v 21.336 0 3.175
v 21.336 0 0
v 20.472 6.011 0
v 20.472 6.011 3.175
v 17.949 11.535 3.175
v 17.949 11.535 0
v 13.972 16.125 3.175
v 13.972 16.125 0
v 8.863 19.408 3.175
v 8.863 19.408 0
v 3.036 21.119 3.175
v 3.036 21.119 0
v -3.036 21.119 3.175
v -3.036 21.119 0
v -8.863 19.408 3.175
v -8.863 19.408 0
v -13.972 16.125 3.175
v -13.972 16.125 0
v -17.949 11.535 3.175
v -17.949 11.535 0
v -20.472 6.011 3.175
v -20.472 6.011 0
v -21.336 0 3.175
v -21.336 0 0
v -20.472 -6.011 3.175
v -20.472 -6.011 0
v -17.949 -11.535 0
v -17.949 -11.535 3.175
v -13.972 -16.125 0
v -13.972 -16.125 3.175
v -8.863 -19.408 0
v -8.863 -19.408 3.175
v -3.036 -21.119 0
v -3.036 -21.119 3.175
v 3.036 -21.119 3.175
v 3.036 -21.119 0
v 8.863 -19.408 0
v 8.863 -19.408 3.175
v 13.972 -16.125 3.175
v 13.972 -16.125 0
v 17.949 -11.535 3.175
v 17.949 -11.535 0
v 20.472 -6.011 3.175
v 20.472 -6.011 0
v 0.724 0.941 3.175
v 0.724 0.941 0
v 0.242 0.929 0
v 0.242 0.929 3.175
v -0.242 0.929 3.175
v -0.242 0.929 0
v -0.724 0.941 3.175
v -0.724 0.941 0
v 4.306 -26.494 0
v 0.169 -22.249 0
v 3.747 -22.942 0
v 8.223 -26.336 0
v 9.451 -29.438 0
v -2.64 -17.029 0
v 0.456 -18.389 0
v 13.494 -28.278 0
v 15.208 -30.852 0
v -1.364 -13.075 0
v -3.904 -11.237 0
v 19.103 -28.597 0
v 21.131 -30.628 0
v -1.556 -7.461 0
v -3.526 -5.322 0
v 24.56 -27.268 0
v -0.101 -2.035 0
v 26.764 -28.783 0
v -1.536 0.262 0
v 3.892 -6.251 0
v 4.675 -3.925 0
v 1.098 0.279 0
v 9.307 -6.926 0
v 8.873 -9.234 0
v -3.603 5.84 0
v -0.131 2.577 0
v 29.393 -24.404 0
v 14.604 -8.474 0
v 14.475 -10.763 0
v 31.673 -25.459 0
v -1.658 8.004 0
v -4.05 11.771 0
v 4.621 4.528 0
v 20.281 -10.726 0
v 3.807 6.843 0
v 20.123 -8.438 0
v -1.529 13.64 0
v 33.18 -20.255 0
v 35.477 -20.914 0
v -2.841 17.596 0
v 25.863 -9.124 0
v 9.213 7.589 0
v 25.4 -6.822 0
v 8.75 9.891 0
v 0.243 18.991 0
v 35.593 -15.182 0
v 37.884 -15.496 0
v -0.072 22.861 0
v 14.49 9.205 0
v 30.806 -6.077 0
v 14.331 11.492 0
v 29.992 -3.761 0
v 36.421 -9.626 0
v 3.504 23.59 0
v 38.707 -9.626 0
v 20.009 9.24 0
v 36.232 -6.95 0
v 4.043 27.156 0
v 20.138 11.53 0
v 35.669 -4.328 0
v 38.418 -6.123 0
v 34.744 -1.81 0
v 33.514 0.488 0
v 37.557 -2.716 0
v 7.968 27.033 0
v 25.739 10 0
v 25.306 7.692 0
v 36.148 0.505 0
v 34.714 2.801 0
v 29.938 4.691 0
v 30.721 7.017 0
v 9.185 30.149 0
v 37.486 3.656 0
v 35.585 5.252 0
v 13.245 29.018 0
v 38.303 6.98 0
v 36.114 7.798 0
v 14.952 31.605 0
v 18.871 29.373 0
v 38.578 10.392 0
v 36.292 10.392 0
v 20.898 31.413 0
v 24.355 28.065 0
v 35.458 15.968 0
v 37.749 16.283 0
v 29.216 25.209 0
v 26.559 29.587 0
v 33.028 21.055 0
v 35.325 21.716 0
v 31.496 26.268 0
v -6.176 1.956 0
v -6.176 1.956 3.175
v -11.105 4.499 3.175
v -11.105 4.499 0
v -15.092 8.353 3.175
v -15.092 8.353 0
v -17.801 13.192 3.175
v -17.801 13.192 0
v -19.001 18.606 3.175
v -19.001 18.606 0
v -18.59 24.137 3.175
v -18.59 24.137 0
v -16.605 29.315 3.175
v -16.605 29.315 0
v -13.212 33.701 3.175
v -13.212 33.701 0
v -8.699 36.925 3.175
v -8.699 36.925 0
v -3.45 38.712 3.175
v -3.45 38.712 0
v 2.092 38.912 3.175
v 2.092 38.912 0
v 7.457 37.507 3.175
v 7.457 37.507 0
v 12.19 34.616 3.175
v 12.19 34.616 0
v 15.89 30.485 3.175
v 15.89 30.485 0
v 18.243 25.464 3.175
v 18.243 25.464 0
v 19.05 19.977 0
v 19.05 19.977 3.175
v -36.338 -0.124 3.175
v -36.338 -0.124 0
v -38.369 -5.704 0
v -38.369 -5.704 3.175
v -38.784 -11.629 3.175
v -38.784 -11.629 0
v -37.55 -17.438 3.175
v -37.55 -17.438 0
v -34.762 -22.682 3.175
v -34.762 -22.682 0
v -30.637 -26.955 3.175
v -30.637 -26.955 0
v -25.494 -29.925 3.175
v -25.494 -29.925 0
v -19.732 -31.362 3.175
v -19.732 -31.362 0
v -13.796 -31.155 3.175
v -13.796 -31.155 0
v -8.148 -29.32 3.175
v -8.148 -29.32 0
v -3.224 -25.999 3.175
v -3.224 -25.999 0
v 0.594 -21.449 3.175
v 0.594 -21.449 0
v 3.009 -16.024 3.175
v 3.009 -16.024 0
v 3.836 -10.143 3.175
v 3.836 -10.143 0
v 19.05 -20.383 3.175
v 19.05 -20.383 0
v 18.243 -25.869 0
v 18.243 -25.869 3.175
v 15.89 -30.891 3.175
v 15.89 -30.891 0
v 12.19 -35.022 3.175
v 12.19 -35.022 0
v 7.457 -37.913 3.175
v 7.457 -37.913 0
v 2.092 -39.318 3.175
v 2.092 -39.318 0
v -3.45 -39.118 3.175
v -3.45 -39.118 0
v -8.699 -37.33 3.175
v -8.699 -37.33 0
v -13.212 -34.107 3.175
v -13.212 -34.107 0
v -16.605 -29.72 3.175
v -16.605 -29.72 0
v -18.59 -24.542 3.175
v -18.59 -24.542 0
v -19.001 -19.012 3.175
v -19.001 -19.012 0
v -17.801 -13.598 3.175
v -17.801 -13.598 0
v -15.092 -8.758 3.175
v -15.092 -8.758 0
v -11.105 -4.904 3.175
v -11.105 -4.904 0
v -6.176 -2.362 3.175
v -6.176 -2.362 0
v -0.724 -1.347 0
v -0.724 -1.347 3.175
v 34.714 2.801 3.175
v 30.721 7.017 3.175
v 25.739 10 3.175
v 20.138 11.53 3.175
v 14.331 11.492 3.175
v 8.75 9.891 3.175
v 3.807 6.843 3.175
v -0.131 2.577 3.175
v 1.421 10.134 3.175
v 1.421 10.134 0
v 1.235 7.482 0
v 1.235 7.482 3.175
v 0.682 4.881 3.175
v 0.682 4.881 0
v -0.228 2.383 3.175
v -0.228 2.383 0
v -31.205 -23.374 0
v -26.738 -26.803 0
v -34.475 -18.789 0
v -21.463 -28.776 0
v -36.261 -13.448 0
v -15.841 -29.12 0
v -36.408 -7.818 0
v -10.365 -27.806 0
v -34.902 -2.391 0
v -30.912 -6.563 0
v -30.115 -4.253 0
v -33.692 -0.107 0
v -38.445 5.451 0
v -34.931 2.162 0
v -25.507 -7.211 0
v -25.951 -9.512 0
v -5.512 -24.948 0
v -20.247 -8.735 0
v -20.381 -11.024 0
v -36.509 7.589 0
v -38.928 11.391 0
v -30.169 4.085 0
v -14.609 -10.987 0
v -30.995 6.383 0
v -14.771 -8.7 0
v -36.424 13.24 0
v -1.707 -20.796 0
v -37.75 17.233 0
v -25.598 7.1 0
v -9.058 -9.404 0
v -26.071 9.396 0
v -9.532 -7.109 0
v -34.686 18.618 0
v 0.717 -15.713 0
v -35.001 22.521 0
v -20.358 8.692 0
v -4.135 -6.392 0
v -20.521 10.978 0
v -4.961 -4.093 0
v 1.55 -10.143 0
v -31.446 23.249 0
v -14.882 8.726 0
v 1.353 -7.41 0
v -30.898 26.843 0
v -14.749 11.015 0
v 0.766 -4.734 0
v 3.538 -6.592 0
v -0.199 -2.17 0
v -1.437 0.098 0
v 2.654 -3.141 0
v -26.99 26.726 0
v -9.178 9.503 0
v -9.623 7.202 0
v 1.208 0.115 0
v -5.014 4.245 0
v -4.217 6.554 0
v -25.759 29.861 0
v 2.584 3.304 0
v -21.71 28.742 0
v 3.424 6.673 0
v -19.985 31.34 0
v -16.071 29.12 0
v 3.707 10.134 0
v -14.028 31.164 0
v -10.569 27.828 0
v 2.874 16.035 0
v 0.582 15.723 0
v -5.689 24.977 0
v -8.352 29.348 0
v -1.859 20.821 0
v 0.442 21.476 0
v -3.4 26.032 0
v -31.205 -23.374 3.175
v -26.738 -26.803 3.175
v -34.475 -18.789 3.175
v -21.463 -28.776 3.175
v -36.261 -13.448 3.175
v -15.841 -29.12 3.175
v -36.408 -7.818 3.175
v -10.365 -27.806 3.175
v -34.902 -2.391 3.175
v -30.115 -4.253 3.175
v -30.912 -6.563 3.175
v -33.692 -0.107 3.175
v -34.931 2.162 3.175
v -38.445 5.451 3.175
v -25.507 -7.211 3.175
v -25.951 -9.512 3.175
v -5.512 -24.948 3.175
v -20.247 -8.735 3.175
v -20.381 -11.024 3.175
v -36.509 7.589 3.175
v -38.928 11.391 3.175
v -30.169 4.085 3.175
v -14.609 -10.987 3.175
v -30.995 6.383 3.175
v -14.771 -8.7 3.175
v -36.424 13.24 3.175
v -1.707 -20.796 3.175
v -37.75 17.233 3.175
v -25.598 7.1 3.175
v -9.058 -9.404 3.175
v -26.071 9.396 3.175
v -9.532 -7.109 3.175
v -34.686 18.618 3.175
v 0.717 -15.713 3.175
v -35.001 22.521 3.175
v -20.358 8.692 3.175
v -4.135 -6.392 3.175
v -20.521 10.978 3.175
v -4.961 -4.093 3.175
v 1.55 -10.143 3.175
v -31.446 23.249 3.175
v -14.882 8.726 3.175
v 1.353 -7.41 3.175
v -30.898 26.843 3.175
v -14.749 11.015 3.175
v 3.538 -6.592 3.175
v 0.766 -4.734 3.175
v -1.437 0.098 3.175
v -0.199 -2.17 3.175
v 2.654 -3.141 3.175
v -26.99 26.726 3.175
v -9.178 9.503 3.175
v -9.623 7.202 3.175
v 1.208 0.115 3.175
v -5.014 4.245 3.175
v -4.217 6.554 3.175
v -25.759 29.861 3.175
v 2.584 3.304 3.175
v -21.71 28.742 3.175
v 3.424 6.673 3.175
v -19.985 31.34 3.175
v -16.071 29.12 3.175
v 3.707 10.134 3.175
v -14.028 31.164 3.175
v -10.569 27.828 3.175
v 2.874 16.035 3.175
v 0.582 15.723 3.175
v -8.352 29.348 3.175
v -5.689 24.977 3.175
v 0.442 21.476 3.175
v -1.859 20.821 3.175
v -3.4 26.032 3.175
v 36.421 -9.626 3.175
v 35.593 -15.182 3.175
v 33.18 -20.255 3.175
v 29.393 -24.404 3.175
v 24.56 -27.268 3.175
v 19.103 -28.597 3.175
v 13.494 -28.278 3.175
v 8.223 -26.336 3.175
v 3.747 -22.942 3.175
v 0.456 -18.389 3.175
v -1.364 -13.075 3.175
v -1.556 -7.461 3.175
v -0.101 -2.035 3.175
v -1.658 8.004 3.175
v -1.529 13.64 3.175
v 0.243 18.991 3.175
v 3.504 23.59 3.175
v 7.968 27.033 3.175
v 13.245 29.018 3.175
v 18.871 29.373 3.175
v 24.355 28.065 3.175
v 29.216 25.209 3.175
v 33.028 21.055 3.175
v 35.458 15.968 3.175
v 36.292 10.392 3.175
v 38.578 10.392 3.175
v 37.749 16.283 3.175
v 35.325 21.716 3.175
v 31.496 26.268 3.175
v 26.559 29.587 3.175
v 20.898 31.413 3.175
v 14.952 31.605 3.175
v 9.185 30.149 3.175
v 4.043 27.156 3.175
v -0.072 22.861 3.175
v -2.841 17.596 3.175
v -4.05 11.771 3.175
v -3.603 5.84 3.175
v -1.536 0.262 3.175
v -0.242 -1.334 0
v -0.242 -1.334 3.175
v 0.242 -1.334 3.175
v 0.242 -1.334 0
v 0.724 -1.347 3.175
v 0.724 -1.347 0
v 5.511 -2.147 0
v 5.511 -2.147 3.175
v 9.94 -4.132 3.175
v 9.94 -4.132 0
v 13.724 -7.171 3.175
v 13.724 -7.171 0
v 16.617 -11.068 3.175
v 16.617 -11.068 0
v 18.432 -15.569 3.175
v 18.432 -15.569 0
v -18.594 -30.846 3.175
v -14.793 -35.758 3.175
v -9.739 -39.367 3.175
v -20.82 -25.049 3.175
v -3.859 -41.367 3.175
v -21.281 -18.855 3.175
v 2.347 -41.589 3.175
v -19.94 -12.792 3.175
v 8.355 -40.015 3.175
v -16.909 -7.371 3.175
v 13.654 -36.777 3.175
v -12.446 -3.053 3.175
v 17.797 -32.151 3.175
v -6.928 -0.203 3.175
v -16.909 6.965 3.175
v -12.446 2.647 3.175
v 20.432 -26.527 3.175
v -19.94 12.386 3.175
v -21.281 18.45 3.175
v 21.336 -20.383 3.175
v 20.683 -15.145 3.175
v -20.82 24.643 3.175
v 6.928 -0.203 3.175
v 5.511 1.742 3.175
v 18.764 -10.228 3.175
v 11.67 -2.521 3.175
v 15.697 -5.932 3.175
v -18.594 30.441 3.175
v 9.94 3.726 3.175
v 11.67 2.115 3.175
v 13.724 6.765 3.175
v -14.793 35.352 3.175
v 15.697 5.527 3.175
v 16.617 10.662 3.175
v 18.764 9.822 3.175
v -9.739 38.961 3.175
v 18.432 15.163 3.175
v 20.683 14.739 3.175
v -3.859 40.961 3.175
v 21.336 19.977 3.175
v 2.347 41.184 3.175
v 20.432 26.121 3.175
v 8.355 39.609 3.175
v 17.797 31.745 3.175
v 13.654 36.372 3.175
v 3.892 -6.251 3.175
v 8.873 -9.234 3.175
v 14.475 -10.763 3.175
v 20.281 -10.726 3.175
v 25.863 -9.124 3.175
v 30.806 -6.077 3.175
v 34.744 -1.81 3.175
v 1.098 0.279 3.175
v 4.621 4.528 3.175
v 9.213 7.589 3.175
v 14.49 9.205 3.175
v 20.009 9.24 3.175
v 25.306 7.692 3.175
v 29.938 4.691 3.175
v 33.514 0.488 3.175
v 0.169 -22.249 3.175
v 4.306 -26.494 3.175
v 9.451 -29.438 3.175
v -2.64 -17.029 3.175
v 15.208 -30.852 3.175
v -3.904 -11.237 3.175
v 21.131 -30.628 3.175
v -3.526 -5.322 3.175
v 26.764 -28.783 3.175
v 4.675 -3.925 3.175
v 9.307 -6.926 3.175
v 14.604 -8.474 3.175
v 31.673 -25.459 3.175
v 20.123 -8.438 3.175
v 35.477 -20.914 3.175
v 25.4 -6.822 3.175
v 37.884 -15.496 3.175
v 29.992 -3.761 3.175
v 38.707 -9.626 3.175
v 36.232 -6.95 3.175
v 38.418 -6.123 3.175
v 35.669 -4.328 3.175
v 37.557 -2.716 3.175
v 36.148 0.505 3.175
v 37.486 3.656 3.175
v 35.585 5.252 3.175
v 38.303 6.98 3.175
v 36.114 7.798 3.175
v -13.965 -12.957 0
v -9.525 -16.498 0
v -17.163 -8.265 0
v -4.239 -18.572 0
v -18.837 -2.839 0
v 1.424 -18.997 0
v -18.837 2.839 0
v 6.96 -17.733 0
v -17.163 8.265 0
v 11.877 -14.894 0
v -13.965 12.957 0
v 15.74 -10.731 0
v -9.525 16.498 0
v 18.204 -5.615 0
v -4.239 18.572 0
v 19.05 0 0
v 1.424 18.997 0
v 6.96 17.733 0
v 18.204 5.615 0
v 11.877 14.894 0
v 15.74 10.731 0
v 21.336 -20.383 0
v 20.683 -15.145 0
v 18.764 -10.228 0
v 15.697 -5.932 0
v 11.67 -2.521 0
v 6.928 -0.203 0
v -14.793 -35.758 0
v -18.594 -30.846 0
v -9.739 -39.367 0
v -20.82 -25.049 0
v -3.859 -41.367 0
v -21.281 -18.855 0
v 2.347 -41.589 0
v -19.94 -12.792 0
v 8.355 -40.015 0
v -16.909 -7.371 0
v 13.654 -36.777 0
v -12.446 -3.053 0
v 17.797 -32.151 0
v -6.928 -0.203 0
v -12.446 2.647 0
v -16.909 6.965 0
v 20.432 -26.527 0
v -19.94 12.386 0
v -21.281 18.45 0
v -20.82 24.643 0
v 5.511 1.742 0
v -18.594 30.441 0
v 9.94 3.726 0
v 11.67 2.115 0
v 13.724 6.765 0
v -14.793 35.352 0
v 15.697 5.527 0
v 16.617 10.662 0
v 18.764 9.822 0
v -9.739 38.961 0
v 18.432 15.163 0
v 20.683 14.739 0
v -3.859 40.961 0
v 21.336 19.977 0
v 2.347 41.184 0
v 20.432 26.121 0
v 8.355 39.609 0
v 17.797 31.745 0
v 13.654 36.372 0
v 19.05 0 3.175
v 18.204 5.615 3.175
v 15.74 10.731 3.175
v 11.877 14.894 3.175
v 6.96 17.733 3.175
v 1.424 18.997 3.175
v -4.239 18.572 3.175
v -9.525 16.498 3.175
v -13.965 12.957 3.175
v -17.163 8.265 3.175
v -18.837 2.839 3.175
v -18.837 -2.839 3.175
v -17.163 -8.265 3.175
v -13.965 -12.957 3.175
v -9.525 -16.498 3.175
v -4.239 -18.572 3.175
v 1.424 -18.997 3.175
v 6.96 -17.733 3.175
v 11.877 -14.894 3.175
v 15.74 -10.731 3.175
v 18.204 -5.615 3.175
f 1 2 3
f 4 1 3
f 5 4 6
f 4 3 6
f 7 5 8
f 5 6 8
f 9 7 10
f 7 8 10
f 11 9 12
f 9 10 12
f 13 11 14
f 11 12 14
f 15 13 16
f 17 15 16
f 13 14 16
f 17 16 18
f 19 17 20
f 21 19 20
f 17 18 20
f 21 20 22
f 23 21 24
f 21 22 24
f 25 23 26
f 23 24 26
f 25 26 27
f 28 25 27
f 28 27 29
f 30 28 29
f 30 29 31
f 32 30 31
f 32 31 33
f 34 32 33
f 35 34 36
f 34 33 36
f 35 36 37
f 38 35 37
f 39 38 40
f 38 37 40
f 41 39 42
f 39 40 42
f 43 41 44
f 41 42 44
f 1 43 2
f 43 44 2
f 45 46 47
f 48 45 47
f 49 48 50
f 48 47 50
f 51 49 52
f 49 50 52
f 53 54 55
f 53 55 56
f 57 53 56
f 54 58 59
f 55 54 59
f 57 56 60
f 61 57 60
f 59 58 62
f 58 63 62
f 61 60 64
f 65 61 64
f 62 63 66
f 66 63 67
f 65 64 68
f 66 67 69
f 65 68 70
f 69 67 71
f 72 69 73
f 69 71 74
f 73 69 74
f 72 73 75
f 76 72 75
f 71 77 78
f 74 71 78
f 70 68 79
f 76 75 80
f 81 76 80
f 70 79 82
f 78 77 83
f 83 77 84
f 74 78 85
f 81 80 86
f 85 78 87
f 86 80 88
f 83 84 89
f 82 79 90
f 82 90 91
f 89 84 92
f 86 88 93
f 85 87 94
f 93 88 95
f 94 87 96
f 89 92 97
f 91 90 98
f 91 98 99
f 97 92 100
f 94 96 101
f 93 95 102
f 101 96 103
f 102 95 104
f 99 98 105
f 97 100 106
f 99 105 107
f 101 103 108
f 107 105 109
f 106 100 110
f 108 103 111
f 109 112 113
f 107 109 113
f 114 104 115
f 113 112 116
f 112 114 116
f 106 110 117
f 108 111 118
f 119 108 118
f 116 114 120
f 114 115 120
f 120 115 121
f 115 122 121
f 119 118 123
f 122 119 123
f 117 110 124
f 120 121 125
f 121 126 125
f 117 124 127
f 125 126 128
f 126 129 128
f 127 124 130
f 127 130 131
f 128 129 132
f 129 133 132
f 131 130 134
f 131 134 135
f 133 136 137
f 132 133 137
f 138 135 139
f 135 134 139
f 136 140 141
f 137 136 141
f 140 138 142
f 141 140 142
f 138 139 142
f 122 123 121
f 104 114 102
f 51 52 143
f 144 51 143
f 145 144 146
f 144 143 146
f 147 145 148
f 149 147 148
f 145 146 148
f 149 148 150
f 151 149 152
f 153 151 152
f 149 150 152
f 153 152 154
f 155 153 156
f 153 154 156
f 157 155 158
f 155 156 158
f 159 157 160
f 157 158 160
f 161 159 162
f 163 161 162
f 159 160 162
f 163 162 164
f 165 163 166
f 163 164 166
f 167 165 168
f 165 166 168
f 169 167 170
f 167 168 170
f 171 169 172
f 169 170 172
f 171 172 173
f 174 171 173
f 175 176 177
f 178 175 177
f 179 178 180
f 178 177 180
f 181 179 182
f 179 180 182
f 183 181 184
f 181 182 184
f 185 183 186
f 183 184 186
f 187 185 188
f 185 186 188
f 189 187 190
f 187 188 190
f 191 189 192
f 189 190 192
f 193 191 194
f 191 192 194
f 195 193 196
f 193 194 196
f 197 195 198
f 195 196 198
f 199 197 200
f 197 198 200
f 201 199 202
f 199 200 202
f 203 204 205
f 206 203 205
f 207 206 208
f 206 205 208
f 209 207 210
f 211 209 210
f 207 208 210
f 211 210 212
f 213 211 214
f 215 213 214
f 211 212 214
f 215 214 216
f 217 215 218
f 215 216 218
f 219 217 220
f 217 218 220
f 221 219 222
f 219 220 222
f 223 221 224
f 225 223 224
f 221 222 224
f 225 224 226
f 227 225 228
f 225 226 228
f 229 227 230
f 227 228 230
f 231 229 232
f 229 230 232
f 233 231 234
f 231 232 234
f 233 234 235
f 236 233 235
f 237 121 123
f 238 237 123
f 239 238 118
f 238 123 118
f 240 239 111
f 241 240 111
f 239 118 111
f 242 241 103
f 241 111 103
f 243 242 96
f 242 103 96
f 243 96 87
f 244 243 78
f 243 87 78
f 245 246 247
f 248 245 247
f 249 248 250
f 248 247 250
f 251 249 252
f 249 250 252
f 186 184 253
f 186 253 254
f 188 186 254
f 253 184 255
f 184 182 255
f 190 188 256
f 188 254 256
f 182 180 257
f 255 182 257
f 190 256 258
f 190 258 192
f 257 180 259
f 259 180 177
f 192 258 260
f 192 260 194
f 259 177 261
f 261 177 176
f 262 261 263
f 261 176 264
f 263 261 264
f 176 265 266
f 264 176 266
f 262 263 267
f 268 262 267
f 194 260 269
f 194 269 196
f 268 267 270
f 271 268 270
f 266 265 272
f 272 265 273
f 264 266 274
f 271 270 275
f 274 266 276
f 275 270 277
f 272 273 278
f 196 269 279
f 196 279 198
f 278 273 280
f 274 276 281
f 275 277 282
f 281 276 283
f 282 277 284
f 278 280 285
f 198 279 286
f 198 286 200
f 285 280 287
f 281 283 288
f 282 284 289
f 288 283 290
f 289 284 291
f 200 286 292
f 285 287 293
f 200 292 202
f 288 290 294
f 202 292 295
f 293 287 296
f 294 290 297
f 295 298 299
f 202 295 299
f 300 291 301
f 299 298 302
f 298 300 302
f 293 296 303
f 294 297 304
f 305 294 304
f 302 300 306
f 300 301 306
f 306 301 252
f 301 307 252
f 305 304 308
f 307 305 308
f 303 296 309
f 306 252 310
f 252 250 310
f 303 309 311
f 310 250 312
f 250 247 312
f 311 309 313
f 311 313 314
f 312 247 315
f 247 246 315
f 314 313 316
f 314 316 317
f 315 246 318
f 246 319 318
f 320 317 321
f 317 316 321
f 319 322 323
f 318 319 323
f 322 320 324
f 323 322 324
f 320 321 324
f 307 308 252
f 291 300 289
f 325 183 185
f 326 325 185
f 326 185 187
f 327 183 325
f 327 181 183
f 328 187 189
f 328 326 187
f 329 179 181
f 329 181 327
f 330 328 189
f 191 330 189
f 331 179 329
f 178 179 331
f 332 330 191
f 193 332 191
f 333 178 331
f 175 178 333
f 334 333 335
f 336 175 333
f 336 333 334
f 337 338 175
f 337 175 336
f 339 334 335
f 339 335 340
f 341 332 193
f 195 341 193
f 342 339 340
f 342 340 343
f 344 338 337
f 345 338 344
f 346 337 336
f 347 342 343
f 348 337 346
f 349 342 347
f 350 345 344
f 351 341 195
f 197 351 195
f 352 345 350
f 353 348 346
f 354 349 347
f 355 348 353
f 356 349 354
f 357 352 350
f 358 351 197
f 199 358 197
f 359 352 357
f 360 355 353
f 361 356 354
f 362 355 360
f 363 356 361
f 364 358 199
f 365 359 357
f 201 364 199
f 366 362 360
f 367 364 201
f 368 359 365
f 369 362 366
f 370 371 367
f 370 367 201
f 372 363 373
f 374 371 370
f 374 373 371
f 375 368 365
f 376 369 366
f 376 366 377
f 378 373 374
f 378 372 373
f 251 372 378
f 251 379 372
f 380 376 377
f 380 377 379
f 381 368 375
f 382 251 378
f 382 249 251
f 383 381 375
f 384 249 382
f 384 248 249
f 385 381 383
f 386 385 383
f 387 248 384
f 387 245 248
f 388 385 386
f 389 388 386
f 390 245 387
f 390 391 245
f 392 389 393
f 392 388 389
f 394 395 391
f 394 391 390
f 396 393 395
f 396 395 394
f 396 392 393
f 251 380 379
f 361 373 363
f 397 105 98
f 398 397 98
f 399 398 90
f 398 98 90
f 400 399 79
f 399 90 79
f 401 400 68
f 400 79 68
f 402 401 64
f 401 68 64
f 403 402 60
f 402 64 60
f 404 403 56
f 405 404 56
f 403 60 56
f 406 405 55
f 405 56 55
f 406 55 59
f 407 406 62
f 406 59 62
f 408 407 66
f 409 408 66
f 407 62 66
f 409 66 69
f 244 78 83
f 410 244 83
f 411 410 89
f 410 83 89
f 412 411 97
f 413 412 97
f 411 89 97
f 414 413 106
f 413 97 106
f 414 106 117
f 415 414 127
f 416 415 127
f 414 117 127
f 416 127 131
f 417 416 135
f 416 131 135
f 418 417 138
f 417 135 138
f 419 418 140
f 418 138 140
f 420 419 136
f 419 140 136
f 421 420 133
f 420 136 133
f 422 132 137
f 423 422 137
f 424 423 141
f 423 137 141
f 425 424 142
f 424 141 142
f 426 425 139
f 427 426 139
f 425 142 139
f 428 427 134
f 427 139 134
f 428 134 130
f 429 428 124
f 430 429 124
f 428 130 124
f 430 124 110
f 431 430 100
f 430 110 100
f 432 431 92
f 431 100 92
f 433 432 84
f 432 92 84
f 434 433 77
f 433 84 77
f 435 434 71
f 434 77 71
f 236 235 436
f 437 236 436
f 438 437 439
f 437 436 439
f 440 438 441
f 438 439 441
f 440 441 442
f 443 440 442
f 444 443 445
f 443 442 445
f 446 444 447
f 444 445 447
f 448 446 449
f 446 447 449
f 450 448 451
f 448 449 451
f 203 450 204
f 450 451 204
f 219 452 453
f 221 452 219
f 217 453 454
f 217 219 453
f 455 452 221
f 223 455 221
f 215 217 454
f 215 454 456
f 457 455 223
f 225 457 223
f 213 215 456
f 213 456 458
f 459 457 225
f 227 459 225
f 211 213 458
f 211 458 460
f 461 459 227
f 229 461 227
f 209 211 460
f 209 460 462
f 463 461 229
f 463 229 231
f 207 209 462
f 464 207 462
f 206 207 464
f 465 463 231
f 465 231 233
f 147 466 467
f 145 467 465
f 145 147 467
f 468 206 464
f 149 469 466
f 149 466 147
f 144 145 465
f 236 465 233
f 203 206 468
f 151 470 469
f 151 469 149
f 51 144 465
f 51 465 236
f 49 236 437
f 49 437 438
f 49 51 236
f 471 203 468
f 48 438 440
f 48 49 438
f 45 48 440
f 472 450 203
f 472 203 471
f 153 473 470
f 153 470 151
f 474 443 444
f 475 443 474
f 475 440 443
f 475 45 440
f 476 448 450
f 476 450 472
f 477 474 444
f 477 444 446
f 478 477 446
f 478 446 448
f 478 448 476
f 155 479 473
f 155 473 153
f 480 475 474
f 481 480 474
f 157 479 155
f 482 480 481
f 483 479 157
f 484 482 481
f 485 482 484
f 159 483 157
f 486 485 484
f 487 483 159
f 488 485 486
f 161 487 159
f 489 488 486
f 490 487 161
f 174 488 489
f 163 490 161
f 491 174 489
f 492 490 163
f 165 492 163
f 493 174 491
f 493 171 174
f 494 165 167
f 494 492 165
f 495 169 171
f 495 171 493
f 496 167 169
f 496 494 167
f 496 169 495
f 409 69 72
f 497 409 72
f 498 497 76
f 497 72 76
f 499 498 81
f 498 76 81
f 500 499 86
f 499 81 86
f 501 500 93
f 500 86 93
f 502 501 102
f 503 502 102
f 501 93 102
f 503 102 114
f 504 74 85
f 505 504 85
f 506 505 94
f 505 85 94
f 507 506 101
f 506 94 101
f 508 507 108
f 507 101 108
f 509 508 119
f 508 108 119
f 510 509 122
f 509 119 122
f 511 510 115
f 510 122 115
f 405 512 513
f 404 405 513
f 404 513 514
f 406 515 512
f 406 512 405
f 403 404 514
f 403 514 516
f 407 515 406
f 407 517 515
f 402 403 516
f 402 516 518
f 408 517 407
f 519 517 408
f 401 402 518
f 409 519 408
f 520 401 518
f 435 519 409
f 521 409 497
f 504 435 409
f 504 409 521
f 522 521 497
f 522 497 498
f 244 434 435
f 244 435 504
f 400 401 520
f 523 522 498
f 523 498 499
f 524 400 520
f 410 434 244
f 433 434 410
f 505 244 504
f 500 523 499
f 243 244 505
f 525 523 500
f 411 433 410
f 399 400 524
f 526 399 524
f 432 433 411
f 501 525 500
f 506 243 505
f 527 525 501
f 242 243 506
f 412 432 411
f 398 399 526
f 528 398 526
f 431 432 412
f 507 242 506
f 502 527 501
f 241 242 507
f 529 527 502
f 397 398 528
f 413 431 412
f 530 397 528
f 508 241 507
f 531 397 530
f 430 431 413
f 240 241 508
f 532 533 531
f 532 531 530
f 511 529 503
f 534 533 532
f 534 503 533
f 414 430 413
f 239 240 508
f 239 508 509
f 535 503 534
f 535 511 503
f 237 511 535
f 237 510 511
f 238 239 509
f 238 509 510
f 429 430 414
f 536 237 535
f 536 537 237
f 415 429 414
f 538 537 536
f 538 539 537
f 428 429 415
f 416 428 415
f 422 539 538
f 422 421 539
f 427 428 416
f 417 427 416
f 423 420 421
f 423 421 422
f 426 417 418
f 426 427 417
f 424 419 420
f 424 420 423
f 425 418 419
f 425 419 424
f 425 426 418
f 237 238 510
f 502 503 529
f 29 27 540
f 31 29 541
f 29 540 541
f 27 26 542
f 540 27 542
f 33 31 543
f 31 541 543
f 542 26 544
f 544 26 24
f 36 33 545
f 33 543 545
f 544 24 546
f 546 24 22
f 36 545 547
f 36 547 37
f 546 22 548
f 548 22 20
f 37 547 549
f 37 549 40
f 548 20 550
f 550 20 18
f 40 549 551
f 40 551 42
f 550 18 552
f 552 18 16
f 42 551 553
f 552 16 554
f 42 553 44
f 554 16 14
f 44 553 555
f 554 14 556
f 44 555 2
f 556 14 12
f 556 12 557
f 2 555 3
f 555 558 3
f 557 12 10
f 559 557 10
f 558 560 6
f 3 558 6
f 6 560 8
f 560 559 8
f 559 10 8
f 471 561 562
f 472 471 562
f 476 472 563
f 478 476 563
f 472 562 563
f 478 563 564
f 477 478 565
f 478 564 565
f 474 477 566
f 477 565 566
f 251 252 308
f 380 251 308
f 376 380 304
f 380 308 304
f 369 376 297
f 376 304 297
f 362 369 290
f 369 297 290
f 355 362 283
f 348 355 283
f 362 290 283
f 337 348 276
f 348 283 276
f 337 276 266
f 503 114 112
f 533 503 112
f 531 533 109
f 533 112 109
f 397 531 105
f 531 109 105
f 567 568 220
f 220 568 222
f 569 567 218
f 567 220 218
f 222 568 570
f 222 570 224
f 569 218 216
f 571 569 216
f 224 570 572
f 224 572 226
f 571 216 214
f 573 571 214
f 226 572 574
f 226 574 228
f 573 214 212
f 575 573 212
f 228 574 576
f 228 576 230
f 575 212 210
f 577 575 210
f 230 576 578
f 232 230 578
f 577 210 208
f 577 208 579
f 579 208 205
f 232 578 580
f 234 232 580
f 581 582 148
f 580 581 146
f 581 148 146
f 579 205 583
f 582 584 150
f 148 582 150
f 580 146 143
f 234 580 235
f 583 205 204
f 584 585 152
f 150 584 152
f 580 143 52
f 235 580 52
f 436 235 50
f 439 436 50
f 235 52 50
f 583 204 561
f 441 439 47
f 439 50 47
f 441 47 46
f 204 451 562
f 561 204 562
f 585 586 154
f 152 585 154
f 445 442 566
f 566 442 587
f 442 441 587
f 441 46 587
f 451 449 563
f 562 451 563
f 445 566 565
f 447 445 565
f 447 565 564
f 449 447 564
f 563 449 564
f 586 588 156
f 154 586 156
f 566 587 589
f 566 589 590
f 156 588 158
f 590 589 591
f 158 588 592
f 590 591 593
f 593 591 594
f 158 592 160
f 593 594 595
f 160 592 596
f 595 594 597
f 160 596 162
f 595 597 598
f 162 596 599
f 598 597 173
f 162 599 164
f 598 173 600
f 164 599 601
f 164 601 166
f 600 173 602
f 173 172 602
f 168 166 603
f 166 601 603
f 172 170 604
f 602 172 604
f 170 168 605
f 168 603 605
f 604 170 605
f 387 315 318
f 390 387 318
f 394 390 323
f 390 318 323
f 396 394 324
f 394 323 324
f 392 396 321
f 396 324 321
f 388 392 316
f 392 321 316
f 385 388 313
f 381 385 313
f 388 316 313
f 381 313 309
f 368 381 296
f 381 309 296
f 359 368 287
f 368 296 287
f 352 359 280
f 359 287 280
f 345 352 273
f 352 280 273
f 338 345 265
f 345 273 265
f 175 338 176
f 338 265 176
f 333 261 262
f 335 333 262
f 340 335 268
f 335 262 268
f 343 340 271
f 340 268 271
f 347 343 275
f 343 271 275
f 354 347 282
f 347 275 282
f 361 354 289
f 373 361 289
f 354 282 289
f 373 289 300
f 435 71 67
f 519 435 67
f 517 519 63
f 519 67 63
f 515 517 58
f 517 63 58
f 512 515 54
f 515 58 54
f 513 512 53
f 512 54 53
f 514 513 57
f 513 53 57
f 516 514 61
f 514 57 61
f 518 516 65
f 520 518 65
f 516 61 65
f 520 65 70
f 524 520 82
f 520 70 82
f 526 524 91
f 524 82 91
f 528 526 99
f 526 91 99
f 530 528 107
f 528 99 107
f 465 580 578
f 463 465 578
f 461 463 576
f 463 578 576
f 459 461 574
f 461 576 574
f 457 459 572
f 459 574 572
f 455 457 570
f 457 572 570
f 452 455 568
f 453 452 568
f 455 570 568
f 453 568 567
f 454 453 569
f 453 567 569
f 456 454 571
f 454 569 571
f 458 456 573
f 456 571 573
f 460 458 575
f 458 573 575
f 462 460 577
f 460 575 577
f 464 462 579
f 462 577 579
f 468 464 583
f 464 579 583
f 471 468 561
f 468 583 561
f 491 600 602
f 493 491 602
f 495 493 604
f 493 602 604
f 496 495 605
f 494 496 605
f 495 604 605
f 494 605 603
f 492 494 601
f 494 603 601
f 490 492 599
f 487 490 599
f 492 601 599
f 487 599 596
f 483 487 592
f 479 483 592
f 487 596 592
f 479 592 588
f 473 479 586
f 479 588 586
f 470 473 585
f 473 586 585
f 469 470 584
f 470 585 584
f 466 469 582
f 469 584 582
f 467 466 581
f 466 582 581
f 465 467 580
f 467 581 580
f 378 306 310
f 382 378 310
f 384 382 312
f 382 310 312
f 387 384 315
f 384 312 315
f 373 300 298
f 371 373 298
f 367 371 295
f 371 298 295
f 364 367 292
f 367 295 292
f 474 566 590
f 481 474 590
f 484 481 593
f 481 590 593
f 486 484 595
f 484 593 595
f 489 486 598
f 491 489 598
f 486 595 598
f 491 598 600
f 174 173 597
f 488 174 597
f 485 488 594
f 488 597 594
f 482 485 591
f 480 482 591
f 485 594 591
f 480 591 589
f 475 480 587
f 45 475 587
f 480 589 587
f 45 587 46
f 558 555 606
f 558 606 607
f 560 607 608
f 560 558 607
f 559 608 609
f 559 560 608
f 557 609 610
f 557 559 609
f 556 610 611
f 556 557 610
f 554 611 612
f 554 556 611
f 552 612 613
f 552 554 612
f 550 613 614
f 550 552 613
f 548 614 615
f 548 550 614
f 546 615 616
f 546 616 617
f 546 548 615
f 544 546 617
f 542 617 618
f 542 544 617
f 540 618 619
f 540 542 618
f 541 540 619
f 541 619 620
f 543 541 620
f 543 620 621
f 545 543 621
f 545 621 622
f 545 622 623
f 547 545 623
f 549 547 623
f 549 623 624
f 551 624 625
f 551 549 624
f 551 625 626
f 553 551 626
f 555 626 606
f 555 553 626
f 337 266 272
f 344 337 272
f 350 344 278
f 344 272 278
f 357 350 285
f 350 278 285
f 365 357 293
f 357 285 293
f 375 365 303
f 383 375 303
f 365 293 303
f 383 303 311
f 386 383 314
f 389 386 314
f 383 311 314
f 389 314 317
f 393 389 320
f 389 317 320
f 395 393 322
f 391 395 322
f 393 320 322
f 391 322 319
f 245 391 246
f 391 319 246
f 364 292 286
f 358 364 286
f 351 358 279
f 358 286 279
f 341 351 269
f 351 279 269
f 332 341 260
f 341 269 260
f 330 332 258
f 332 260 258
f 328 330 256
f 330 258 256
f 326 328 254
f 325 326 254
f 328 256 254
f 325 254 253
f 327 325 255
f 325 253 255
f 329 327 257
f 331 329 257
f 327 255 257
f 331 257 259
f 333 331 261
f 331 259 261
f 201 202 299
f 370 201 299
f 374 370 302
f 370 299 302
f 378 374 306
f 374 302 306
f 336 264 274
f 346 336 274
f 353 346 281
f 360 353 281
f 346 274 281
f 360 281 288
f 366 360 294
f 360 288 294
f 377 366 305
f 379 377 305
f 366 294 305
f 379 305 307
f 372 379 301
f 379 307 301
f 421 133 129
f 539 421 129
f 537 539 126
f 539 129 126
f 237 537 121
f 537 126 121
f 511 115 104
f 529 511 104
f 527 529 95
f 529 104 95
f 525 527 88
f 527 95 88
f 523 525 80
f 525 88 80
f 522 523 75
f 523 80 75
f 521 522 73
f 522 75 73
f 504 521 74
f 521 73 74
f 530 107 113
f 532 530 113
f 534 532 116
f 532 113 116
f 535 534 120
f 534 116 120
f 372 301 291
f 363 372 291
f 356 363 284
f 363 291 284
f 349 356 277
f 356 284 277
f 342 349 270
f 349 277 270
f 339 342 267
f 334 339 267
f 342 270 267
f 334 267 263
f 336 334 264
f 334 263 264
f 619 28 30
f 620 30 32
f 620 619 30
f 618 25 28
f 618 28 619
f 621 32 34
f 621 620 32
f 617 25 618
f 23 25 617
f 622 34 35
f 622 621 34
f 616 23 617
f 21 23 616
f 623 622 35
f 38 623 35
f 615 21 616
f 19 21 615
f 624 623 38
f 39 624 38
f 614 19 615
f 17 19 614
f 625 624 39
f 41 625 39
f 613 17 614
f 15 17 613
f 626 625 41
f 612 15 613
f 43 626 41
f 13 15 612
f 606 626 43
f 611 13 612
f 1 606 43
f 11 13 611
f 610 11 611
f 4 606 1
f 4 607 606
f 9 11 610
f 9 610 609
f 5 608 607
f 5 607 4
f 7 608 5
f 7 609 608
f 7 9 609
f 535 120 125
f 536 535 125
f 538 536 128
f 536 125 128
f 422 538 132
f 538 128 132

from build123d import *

# Parameters (mm, degrees)
F0_R     = 21.336
F0_R_2   = 19.05
F1_DEPTH = 3.175
F3_DEPTH = 3.175
F5_DEPTH = 3.175
F7_DEPTH = 3.175


with BuildPart() as f1:
    # F0 (on Top) → F1 (new body)
    with BuildSketch(Plane.XY):
        Circle(F0_R)
        Circle(F0_R_2, mode=Mode.SUBTRACT)
    extrude(amount=F1_DEPTH)


with BuildPart() as f3:
    # F2 (on Top) → F3 (new body)
    with BuildSketch(Plane.XY):
        with BuildLine():
            ThreePointArc((-0.7243629604, 0.9409253019), (-13.2118012702, 33.7012444831), (19.05, 19.9771486223))
            ThreePointArc((19.05, 19.9771486223), (13.7240958608, 6.7653473521), (0.7243629604, 0.9409253019))
            ThreePointArc((0.7243629604, 0.9409253019), (3.8685695365, 0.5995762982), (6.9277729052, -0.2028131858))
            ThreePointArc((6.9277729052, -0.2028131858), (17.3642716332, 7.5792872484), (21.336, 19.9771486223))
            ThreePointArc((21.336, 19.9771486223), (-12.3978613739, 37.3414202555), (-6.9277729052, -0.2028131858))
            ThreePointArc((-6.9277729052, -0.2028131858), (-3.8685695365, 0.5995762982), (-0.7243629604, 0.9409253019))
        make_face()
        with BuildLine():
            ThreePointArc((0.7243629604, 0.9409253019), (0, 0.9271486223), (-0.7243629604, 0.9409253019))
            ThreePointArc((-0.7243629604, 0.9409253019), (-3.8685695365, 0.5995762982), (-6.9277729052, -0.2028131858))
            ThreePointArc((-6.9277729052, -0.2028131858), (-3.8685695365, -1.0052026697), (-0.7243629604, -1.3465516734))
            ThreePointArc((-0.7243629604, -1.3465516734), (0, -1.3327749938), (0.7243629604, -1.3465516734))
            ThreePointArc((0.7243629604, -1.3465516734), (3.8685695365, -1.0052026697), (6.9277729052, -0.2028131858))
            ThreePointArc((6.9277729052, -0.2028131858), (3.8685695365, 0.5995762982), (0.7243629604, 0.9409253019))
        make_face()
        with BuildLine():
            ThreePointArc((-0.7243629604, -1.3465516734), (-3.8685695365, -1.0052026697), (-6.9277729052, -0.2028131858))
            ThreePointArc((-6.9277729052, -0.2028131858), (-12.3978613739, -37.747046627), (21.336, -20.3827749938))
            ThreePointArc((21.336, -20.3827749938), (17.3642716332, -7.9849136199), (6.9277729052, -0.2028131858))
            ThreePointArc((6.9277729052, -0.2028131858), (3.8685695365, -1.0052026697), (0.7243629604, -1.3465516734))
            ThreePointArc((0.7243629604, -1.3465516734), (13.7240958608, -7.1709737236), (19.05, -20.3827749938))
            ThreePointArc((19.05, -20.3827749938), (-13.2118012702, -34.1068708546), (-0.7243629604, -1.3465516734))
        make_face()
    extrude(amount=F3_DEPTH)


with BuildPart() as f5:
    # F4 (on Top) → F5 (new body)
    with BuildSketch(Plane.XY):
        with BuildLine():
            ThreePointArc((-34.9307937454, 2.1616098706), (-21.7103421779, 28.7418947055), (1.4206783354, 10.1341605186))
            ThreePointArc((1.4206783354, 10.1341605186), (1.0040282244, 6.1717405616), (-0.2276966689, 2.3826479237))
            ThreePointArc((-0.2276966689, 2.3826479237), (0.52586092, 1.2715491548), (1.20804735, 0.115257155))
            ThreePointArc((1.20804735, 0.115257155), (3.0725985519, 4.9712741793), (3.7066783354, 10.1341605186))
            ThreePointArc((3.7066783354, 10.1341605186), (-22.9239595032, 30.8027769735), (-36.3375385898, -0.1238858587))
            ThreePointArc((-36.3375385898, -0.1238858587), (-35.6701366939, 1.0410022147), (-34.9307937454, 2.1616098706))
        make_face()
        with BuildLine():
            ThreePointArc((-33.6923339453, -0.1070374811), (-34.3500840389, 1.0062579326), (-34.9307937454, 2.1616098706))
            ThreePointArc((-34.9307937454, 2.1616098706), (-35.6701366939, 1.0410022147), (-36.3375385898, -0.1238858587))
            ThreePointArc((-36.3375385898, -0.1238858587), (-35.6553521597, -1.2801778585), (-34.9017945709, -2.3912766274))
            ThreePointArc((-34.9017945709, -2.3912766274), (-34.3358491905, -1.2286211797), (-33.6923339453, -0.1070374811))
        make_face()
        with BuildLine():
            ThreePointArc((1.20804735, 0.115257155), (0.52586092, 1.2715491548), (-0.2276966689, 2.3826479237))
            ThreePointArc((-0.2276966689, 2.3826479237), (-0.7936420493, 1.219992476), (-1.4371572945, 0.0984087774))
            ThreePointArc((-1.4371572945, 0.0984087774), (-0.7794072008, -1.0148866363), (-0.1986974944, -2.1702385742))
            ThreePointArc((-0.1986974944, -2.1702385742), (0.5406454541, -1.0496309183), (1.20804735, 0.115257155))
        make_face()
        with BuildLine():
            ThreePointArc((-34.9017945709, -2.3912766274), (-35.6553521597, -1.2801778585), (-36.3375385898, -0.1238858587))
            ThreePointArc((-36.3375385898, -0.1238858587), (-22.6630559145, -30.8447094387), (3.8358304248, -10.1427892223))
            ThreePointArc((3.8358304248, -10.1427892223), (3.1684468796, -4.8481513837), (1.20804735, 0.115257155))
            ThreePointArc((1.20804735, 0.115257155), (0.5406454541, -1.0496309183), (-0.1986974944, -2.1702385742))
            ThreePointArc((-0.1986974944, -2.1702385742), (1.1075646117, -6.061768709), (1.5498304248, -10.1427892223))
            ThreePointArc((1.5498304248, -10.1427892223), (-21.4625895323, -28.7761391113), (-34.9017945709, -2.3912766274))
        make_face()
        with BuildLine():
            ThreePointArc((-0.2276966689, 2.3826479237), (-17.6360644272, 11.1927779975), (-34.9307937454, 2.1616098706))
            ThreePointArc((-34.9307937454, 2.1616098706), (-34.3500840389, 1.0062579326), (-33.6923339453, -0.1070374811))
            ThreePointArc((-33.6923339453, -0.1070374811), (-17.6215042645, 8.9068243668), (-1.4371572945, 0.0984087774))
            ThreePointArc((-1.4371572945, 0.0984087774), (-0.7936420493, 1.219992476), (-0.2276966689, 2.3826479237))
        make_face()
        with BuildLine():
            ThreePointArc((-1.4371572945, 0.0984087774), (-17.5079869753, -8.9154530704), (-33.6923339453, -0.1070374811))
            ThreePointArc((-33.6923339453, -0.1070374811), (-34.3358491905, -1.2286211797), (-34.9017945709, -2.3912766274))
            ThreePointArc((-34.9017945709, -2.3912766274), (-17.4934268126, -11.2014067011), (-0.1986974944, -2.1702385742))
            ThreePointArc((-0.1986974944, -2.1702385742), (-0.7794072008, -1.0148866363), (-1.4371572945, 0.0984087774))
        make_face()
    extrude(amount=F5_DEPTH)


with BuildPart() as f7:
    # F6 (on Top) → F7 (new body)
    with BuildSketch(Plane.XY):
        with BuildLine():
            ThreePointArc((-0.1309316487, 2.576553171), (13.2449427332, 29.0184454449), (36.2918635339, 10.3924656287))
            ThreePointArc((36.2918635339, 10.3924656287), (35.8932420461, 6.5157944288), (34.7140599022, 2.8013620154))
            ThreePointArc((34.7140599022, 2.8013620154), (35.4677000889, 1.6758108564), (36.14839941, 0.5047056617))
            ThreePointArc((36.14839941, 0.5047056617), (37.96159743, 5.3015400475), (38.5778635339, 10.3924656287))
            ThreePointArc((38.5778635339, 10.3924656287), (12.0173695265, 31.0789239618), (-1.5355183903, 0.2615809647))
            ThreePointArc((-1.5355183903, 0.2615809647), (-0.8699863043, 1.4413716178), (-0.1309316487, 2.576553171))
        make_face()
        with BuildLine():
            ThreePointArc((1.0983912169, 0.2785741149), (0.4443868272, 1.4065168034), (-0.1309316487, 2.576553171))
            ThreePointArc((-0.1309316487, 2.576553171), (-0.8699863043, 1.4413716178), (-1.5355183903, 0.2615809647))
            ThreePointArc((-1.5355183903, 0.2615809647), (-0.8548190692, -0.9095242299), (-0.1011788825, -2.035075389))
            ThreePointArc((-0.1011788825, -2.035075389), (0.4589949217, -0.857713185), (1.0983912169, 0.2785741149))
        make_face()
        with BuildLine():
            ThreePointArc((36.14839941, 0.5047056617), (35.4677000889, 1.6758108564), (34.7140599022, 2.8013620154))
            ThreePointArc((34.7140599022, 2.8013620154), (34.153886098, 1.6239998114), (33.5144898028, 0.4877125115))
            ThreePointArc((33.5144898028, 0.4877125115), (34.1684941925, -0.640230177), (34.7438126684, -1.8102665446))
            ThreePointArc((34.7438126684, -1.8102665446), (35.482867324, -0.6750849914), (36.14839941, 0.5047056617))
        make_face()
        with BuildLine():
            ThreePointArc((-0.1011788825, -2.035075389), (-0.8548190692, -0.9095242299), (-1.5355183903, 0.2615809647))
            ThreePointArc((-1.5355183903, 0.2615809647), (12.2800919047, -30.3459128984), (38.7070174859, -9.6261790022))
            ThreePointArc((38.7070174859, -9.6261790022), (38.057475819, -4.4016849948), (36.14839941, 0.5047056617))
            ThreePointArc((36.14839941, 0.5047056617), (35.482867324, -0.6750849914), (34.7438126684, -1.8102665446))
            ThreePointArc((34.7438126684, -1.8102665446), (35.9969973021, -5.6292582016), (36.4210174859, -9.6261790022))
            ThreePointArc((36.4210174859, -9.6261790022), (13.494346286, -28.2775575145), (-0.1011788825, -2.035075389))
        make_face()
        with BuildLine():
            ThreePointArc((34.7140599022, 2.8013620154), (17.2333672392, 11.7093769645), (-0.1309316487, 2.576553171))
            ThreePointArc((-0.1309316487, 2.576553171), (0.4443868272, 1.4065168034), (1.0983912169, 0.2785741149))
            ThreePointArc((1.0983912169, 0.2785741149), (17.2481154799, 9.4234245395), (33.5144898028, 0.4877125115))
            ThreePointArc((33.5144898028, 0.4877125115), (34.153886098, 1.6239998114), (34.7140599022, 2.8013620154))
        make_face()
        with BuildLine():
            ThreePointArc((33.5144898028, 0.4877125115), (17.3647655398, -8.657137913), (1.0983912169, 0.2785741149))
            ThreePointArc((1.0983912169, 0.2785741149), (0.4589949217, -0.857713185), (-0.1011788825, -2.035075389))
            ThreePointArc((-0.1011788825, -2.035075389), (17.3795137805, -10.943090338), (34.7438126684, -1.8102665446))
            ThreePointArc((34.7438126684, -1.8102665446), (34.1684941925, -0.640230177), (33.5144898028, 0.4877125115))
        make_face()
    extrude(amount=F7_DEPTH)


solid = Compound([f1.part, f3.part, f5.part, f7.part])
